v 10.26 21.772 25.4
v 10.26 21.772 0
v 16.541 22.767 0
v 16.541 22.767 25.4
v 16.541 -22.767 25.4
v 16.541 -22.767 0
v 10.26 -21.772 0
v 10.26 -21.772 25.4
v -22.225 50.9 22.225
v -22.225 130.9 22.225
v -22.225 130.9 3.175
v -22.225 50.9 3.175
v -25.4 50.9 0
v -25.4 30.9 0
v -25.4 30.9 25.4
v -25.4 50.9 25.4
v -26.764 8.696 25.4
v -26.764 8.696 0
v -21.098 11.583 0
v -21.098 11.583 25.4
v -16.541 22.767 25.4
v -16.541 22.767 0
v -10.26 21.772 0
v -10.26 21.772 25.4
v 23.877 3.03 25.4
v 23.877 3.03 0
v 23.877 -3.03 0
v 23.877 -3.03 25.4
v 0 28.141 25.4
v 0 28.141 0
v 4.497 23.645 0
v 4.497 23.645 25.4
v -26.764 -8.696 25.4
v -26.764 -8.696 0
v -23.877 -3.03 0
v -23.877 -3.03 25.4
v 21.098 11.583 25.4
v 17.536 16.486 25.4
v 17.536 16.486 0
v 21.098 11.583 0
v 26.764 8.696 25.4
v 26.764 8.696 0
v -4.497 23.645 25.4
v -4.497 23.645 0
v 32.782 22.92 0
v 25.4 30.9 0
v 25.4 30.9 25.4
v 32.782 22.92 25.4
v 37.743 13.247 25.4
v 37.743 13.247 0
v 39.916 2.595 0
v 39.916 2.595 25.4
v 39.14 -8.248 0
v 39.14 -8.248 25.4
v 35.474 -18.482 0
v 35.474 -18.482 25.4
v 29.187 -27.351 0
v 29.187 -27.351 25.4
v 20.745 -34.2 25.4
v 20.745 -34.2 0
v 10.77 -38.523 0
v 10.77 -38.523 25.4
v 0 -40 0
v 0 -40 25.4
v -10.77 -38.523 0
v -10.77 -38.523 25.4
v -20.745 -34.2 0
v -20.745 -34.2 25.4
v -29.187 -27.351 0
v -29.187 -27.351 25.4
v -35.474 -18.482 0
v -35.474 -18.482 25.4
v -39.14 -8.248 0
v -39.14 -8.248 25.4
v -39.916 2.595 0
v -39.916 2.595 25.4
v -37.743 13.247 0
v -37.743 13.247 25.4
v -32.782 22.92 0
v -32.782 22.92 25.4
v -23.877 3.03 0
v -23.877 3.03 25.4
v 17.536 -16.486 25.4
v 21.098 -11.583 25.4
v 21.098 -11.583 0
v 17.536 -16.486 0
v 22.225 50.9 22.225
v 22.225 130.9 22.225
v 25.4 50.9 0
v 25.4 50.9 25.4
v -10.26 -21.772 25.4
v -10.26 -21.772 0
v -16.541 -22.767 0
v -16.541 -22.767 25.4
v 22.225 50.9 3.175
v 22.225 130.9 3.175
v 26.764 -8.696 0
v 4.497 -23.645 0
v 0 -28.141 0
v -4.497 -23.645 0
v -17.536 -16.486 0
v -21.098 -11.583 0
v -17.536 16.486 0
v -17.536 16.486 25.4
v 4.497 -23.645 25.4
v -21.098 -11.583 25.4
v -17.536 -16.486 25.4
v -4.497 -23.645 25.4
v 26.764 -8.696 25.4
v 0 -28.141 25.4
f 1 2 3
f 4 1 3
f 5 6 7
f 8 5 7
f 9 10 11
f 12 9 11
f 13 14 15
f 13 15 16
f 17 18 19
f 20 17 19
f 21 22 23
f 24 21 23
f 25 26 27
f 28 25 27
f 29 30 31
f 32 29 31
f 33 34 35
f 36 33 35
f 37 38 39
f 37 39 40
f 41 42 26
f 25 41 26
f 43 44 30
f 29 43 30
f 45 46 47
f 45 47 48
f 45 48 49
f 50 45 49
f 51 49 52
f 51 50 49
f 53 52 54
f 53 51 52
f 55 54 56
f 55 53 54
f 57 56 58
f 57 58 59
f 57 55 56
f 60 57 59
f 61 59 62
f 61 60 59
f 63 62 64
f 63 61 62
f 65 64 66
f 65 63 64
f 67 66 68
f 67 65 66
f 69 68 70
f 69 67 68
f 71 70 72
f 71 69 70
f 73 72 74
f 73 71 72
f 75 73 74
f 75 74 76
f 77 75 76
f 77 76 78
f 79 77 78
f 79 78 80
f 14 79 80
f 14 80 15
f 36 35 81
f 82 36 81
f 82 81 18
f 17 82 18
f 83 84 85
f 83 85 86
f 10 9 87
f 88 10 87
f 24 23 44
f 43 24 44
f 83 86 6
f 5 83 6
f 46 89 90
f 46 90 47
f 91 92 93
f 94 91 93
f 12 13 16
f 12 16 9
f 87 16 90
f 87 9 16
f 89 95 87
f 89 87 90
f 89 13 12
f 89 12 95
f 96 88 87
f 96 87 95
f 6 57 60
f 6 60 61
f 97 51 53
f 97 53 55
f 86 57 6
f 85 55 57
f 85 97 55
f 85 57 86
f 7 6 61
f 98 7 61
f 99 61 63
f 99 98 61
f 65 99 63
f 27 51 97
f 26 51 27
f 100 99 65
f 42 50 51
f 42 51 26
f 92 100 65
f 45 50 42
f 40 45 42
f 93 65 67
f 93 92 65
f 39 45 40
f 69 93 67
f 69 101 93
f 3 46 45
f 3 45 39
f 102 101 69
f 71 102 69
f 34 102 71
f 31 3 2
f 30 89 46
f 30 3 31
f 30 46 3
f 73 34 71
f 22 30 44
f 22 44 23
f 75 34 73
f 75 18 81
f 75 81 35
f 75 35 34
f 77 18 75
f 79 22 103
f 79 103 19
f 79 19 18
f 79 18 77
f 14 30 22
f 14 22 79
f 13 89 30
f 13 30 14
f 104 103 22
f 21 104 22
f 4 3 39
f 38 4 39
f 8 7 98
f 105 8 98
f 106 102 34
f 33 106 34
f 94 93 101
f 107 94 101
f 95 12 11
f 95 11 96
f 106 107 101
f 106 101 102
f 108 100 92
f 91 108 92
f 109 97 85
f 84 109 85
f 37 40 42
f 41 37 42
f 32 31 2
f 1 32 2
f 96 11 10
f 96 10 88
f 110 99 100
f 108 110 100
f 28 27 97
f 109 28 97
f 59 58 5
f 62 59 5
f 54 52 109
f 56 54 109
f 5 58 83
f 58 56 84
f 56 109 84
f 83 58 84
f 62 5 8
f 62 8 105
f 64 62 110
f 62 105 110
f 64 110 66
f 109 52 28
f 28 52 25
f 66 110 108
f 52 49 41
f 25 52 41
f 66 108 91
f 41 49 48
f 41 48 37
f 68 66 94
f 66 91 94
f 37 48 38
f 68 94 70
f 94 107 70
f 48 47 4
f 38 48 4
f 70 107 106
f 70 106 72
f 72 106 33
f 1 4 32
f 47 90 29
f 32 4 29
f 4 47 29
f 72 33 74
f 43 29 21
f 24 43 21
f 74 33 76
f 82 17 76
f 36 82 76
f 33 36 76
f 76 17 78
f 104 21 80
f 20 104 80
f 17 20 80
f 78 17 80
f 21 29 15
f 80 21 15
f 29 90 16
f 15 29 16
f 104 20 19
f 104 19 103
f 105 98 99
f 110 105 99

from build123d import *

# Parameters (mm, degrees)
BOSS_EXTRUDE2_DEPTH      = 25.4
CUT_EXTRUDE2_START       = 50.900485433
CUT_EXTRUDE2_OUTLINE_W   = 50.8
CUT_EXTRUDE2_OUTLINE_H   = 25.4
CUT_EXTRUDE2_OUTLINE_W_2 = 44.45
CUT_EXTRUDE2_OUTLINE_H_2 = 19.05
CUT_EXTRUDE2_DEPTH       = 80


# Read off the part's stored shape, not the designer's step: Cut-Extrude2
with BuildPart() as part:
    # Sketch2 → Boss-Extrude2 (new body)
    with BuildSketch(Plane.XY):
        with BuildLine():
            Line((-25.4, 130.900485433), (25.4, 130.900485433))
            Line((25.4, 130.900485433), (25.4, 30.900485433))
            ThreePointArc((25.4, 30.900485433), (0, -40), (-25.4, 30.900485433))
            Line((-25.4, 30.900485433), (-25.4, 130.900485433))
        make_face()
        Polygon((-16.541112452, 22.766888123), (-10.26013758, 21.772079433), (-4.496681536, 23.64473982), (0, 28.141421356), (4.496681536, 23.64473982), (10.26013758, 21.772079433), (16.541112452, 22.766888123), (17.535921141, 16.485913251), (21.09793287, 11.583224708), (26.764082159, 8.696177445), (23.877034895, 3.030028156), (23.877034895, -3.030028156), (26.764082159, -8.696177445), (21.09793287, -11.583224708), (17.535921141, -16.485913251), (16.541112452, -22.766888123), (10.26013758, -21.772079433), (4.496681536, -23.64473982), (0, -28.141421356), (-4.496681536, -23.64473982), (-10.26013758, -21.772079433), (-16.541112452, -22.766888123), (-17.535921141, -16.485913251), (-21.09793287, -11.583224708), (-26.764082159, -8.696177445), (-23.877034895, -3.030028156), (-23.877034895, 3.030028156), (-26.764082159, 8.696177445), (-21.09793287, 11.583224708), (-17.535921141, 16.485913251), align=None, mode=Mode.SUBTRACT)
    extrude(amount=BOSS_EXTRUDE2_DEPTH)

    # Cut-Extrude2 outline → Cut-Extrude2 (cut)
    with BuildSketch(Plane(origin=(0, 0, 0), x_dir=(1, 0, 0), z_dir=(0, 1, 0)).offset(CUT_EXTRUDE2_START)):
        with Locations((0, -12.7)):
            Rectangle(CUT_EXTRUDE2_OUTLINE_W, CUT_EXTRUDE2_OUTLINE_H)
        with Locations((0, -12.7)):
            Rectangle(CUT_EXTRUDE2_OUTLINE_W_2, CUT_EXTRUDE2_OUTLINE_H_2, mode=Mode.SUBTRACT)
    extrude(amount=CUT_EXTRUDE2_DEPTH, mode=Mode.SUBTRACT)


solid = part.part
